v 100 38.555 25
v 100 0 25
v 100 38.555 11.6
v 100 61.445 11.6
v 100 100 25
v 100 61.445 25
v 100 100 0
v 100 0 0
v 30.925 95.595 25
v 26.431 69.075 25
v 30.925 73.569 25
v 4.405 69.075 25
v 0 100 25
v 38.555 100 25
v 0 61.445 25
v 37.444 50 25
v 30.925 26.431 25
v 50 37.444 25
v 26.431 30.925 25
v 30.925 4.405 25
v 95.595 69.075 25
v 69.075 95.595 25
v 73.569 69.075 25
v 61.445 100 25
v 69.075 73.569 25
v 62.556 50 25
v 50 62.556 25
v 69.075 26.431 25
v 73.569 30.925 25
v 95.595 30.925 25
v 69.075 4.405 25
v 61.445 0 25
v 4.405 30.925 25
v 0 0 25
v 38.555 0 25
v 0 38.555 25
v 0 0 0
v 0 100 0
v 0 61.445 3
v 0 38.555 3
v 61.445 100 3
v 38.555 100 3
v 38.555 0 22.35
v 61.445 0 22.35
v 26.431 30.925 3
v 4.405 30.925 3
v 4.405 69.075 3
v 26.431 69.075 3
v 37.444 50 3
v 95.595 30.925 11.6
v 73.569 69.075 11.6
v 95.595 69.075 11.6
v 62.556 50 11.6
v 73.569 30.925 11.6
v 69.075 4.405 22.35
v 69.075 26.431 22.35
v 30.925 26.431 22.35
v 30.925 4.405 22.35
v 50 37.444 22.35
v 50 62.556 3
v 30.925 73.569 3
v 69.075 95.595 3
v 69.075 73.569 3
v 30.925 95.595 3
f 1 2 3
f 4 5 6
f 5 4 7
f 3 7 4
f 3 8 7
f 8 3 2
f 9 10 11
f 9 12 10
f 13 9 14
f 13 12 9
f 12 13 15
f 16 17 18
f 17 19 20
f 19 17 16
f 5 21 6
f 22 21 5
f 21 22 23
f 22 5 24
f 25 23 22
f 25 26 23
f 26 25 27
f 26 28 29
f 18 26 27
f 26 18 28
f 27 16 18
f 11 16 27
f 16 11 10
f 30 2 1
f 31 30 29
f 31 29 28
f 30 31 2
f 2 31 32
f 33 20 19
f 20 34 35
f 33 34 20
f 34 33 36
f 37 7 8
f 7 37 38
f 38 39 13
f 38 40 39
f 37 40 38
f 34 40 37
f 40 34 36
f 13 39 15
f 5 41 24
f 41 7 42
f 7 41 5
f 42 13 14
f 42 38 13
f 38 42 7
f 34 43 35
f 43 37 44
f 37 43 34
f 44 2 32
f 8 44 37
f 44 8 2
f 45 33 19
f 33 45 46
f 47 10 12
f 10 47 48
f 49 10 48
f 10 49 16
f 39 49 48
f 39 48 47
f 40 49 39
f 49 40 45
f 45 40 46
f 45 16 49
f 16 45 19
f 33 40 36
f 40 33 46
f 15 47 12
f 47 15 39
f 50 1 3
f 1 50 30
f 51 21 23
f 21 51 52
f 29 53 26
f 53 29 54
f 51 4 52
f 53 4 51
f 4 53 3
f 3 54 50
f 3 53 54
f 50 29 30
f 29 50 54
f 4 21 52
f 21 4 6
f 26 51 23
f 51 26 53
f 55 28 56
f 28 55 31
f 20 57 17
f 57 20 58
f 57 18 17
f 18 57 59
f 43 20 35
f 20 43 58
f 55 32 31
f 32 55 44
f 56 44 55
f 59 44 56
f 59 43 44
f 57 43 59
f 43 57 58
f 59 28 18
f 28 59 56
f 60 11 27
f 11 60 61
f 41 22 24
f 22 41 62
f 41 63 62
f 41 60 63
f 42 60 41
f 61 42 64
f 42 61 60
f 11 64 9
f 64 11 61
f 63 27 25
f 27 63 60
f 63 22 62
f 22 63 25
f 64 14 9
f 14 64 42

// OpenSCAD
// file: HexPileLib.scad
module LeftPile(totalHeight, singlePileHeight, singlePileDiameter, pileCount){
    pileHeight = (pileCount * singlePileHeight) + .5;
    offset = singlePileDiameter * .15;
    translate([singlePileDiameter/2 - offset, singlePileDiameter/2, totalHeight - pileHeight])
        cylinder(pileHeight, d=singlePileDiameter, $fn=6);
}

module RightPile(totalHeight, singlePileHeight, singlePileDiameter, pileCount){
    translate([0, singlePileDiameter, 0])
        rotate([0, 0, 180])
            LeftPile(totalHeight, singlePileHeight, singlePileDiameter, pileCount);
}

module BottomPile(totalHeight, singlePileHeight, singlePileDiameter, pileCount){
    translate([singlePileDiameter, 0, 0])
        rotate([0, 0, 90])
            LeftPile(totalHeight, singlePileHeight, singlePileDiameter, pileCount);
}

module TopPile(totalHeight, singlePileHeight, singlePileDiameter, pileCount){
        rotate([0, 0, 270])
            LeftPile(totalHeight, singlePileHeight, singlePileDiameter, pileCount);
}
// file: ColonistsPlacePileLib.scad
include<HexPileLib.scad>
//25.82 by 32.82 by 2.15
singlePlacePileHeight = 2.15;
//flat to flat = d = 38.15
//D = d * 2/rt(3)
d = 38.15;
D = d * 2/sqrt(3);
singlePlacePileDiameter = D;

module LeftPlacePile(totalHeight, placePileCount){
    LeftPile(
        totalHeight,
        singlePlacePileHeight,
        singlePlacePileDiameter,
        placePileCount);
}

module RightPlacePile(totalHeight, placePileCount){
    RightPile(
        totalHeight,
        singlePlacePileHeight,
        singlePlacePileDiameter,
        placePileCount);
}

module BottomPlacePile(totalHeight, placePileCount){
    BottomPile(
        totalHeight,
        singlePlacePileHeight,
        singlePlacePileDiameter,
        placePileCount);
}

module TopPlacePile(totalHeight, placePileCount){
    TopPile(
        totalHeight,
        singlePlacePileHeight,
        singlePlacePileDiameter,
        placePileCount);
}

function placePileHeight(placePileCount) =
    (placePileCount * singlePlacePileHeight) + .5;

function actualPlacePileWidth() = singlePlacePileDiameter * .85;
    
// main file
include<ColonistsPlacePileLib.scad>
difference() {
    testBoxHeight = placePileHeight(10) + 3;
    testBoxLength = 100;
    testBoxWidth = 100;
    wallThickness = 3;
    
    cube([testBoxLength, testBoxWidth, testBoxHeight]);
    translate([0, testBoxWidth/2 - singlePlacePileDiameter/2, 0])
        LeftPlacePile(testBoxHeight, 10);
    translate([testBoxLength, testBoxWidth/2 - singlePlacePileDiameter/2, 0])
        RightPlacePile(testBoxHeight, 6);
    translate([testBoxLength/2 - singlePlacePileDiameter/2, 0, 0])
        BottomPlacePile(testBoxHeight, 1);
    translate([testBoxLength/2 - singlePlacePileDiameter/2, testBoxWidth, 0])
        TopPlacePile(testBoxHeight, 10);
}
